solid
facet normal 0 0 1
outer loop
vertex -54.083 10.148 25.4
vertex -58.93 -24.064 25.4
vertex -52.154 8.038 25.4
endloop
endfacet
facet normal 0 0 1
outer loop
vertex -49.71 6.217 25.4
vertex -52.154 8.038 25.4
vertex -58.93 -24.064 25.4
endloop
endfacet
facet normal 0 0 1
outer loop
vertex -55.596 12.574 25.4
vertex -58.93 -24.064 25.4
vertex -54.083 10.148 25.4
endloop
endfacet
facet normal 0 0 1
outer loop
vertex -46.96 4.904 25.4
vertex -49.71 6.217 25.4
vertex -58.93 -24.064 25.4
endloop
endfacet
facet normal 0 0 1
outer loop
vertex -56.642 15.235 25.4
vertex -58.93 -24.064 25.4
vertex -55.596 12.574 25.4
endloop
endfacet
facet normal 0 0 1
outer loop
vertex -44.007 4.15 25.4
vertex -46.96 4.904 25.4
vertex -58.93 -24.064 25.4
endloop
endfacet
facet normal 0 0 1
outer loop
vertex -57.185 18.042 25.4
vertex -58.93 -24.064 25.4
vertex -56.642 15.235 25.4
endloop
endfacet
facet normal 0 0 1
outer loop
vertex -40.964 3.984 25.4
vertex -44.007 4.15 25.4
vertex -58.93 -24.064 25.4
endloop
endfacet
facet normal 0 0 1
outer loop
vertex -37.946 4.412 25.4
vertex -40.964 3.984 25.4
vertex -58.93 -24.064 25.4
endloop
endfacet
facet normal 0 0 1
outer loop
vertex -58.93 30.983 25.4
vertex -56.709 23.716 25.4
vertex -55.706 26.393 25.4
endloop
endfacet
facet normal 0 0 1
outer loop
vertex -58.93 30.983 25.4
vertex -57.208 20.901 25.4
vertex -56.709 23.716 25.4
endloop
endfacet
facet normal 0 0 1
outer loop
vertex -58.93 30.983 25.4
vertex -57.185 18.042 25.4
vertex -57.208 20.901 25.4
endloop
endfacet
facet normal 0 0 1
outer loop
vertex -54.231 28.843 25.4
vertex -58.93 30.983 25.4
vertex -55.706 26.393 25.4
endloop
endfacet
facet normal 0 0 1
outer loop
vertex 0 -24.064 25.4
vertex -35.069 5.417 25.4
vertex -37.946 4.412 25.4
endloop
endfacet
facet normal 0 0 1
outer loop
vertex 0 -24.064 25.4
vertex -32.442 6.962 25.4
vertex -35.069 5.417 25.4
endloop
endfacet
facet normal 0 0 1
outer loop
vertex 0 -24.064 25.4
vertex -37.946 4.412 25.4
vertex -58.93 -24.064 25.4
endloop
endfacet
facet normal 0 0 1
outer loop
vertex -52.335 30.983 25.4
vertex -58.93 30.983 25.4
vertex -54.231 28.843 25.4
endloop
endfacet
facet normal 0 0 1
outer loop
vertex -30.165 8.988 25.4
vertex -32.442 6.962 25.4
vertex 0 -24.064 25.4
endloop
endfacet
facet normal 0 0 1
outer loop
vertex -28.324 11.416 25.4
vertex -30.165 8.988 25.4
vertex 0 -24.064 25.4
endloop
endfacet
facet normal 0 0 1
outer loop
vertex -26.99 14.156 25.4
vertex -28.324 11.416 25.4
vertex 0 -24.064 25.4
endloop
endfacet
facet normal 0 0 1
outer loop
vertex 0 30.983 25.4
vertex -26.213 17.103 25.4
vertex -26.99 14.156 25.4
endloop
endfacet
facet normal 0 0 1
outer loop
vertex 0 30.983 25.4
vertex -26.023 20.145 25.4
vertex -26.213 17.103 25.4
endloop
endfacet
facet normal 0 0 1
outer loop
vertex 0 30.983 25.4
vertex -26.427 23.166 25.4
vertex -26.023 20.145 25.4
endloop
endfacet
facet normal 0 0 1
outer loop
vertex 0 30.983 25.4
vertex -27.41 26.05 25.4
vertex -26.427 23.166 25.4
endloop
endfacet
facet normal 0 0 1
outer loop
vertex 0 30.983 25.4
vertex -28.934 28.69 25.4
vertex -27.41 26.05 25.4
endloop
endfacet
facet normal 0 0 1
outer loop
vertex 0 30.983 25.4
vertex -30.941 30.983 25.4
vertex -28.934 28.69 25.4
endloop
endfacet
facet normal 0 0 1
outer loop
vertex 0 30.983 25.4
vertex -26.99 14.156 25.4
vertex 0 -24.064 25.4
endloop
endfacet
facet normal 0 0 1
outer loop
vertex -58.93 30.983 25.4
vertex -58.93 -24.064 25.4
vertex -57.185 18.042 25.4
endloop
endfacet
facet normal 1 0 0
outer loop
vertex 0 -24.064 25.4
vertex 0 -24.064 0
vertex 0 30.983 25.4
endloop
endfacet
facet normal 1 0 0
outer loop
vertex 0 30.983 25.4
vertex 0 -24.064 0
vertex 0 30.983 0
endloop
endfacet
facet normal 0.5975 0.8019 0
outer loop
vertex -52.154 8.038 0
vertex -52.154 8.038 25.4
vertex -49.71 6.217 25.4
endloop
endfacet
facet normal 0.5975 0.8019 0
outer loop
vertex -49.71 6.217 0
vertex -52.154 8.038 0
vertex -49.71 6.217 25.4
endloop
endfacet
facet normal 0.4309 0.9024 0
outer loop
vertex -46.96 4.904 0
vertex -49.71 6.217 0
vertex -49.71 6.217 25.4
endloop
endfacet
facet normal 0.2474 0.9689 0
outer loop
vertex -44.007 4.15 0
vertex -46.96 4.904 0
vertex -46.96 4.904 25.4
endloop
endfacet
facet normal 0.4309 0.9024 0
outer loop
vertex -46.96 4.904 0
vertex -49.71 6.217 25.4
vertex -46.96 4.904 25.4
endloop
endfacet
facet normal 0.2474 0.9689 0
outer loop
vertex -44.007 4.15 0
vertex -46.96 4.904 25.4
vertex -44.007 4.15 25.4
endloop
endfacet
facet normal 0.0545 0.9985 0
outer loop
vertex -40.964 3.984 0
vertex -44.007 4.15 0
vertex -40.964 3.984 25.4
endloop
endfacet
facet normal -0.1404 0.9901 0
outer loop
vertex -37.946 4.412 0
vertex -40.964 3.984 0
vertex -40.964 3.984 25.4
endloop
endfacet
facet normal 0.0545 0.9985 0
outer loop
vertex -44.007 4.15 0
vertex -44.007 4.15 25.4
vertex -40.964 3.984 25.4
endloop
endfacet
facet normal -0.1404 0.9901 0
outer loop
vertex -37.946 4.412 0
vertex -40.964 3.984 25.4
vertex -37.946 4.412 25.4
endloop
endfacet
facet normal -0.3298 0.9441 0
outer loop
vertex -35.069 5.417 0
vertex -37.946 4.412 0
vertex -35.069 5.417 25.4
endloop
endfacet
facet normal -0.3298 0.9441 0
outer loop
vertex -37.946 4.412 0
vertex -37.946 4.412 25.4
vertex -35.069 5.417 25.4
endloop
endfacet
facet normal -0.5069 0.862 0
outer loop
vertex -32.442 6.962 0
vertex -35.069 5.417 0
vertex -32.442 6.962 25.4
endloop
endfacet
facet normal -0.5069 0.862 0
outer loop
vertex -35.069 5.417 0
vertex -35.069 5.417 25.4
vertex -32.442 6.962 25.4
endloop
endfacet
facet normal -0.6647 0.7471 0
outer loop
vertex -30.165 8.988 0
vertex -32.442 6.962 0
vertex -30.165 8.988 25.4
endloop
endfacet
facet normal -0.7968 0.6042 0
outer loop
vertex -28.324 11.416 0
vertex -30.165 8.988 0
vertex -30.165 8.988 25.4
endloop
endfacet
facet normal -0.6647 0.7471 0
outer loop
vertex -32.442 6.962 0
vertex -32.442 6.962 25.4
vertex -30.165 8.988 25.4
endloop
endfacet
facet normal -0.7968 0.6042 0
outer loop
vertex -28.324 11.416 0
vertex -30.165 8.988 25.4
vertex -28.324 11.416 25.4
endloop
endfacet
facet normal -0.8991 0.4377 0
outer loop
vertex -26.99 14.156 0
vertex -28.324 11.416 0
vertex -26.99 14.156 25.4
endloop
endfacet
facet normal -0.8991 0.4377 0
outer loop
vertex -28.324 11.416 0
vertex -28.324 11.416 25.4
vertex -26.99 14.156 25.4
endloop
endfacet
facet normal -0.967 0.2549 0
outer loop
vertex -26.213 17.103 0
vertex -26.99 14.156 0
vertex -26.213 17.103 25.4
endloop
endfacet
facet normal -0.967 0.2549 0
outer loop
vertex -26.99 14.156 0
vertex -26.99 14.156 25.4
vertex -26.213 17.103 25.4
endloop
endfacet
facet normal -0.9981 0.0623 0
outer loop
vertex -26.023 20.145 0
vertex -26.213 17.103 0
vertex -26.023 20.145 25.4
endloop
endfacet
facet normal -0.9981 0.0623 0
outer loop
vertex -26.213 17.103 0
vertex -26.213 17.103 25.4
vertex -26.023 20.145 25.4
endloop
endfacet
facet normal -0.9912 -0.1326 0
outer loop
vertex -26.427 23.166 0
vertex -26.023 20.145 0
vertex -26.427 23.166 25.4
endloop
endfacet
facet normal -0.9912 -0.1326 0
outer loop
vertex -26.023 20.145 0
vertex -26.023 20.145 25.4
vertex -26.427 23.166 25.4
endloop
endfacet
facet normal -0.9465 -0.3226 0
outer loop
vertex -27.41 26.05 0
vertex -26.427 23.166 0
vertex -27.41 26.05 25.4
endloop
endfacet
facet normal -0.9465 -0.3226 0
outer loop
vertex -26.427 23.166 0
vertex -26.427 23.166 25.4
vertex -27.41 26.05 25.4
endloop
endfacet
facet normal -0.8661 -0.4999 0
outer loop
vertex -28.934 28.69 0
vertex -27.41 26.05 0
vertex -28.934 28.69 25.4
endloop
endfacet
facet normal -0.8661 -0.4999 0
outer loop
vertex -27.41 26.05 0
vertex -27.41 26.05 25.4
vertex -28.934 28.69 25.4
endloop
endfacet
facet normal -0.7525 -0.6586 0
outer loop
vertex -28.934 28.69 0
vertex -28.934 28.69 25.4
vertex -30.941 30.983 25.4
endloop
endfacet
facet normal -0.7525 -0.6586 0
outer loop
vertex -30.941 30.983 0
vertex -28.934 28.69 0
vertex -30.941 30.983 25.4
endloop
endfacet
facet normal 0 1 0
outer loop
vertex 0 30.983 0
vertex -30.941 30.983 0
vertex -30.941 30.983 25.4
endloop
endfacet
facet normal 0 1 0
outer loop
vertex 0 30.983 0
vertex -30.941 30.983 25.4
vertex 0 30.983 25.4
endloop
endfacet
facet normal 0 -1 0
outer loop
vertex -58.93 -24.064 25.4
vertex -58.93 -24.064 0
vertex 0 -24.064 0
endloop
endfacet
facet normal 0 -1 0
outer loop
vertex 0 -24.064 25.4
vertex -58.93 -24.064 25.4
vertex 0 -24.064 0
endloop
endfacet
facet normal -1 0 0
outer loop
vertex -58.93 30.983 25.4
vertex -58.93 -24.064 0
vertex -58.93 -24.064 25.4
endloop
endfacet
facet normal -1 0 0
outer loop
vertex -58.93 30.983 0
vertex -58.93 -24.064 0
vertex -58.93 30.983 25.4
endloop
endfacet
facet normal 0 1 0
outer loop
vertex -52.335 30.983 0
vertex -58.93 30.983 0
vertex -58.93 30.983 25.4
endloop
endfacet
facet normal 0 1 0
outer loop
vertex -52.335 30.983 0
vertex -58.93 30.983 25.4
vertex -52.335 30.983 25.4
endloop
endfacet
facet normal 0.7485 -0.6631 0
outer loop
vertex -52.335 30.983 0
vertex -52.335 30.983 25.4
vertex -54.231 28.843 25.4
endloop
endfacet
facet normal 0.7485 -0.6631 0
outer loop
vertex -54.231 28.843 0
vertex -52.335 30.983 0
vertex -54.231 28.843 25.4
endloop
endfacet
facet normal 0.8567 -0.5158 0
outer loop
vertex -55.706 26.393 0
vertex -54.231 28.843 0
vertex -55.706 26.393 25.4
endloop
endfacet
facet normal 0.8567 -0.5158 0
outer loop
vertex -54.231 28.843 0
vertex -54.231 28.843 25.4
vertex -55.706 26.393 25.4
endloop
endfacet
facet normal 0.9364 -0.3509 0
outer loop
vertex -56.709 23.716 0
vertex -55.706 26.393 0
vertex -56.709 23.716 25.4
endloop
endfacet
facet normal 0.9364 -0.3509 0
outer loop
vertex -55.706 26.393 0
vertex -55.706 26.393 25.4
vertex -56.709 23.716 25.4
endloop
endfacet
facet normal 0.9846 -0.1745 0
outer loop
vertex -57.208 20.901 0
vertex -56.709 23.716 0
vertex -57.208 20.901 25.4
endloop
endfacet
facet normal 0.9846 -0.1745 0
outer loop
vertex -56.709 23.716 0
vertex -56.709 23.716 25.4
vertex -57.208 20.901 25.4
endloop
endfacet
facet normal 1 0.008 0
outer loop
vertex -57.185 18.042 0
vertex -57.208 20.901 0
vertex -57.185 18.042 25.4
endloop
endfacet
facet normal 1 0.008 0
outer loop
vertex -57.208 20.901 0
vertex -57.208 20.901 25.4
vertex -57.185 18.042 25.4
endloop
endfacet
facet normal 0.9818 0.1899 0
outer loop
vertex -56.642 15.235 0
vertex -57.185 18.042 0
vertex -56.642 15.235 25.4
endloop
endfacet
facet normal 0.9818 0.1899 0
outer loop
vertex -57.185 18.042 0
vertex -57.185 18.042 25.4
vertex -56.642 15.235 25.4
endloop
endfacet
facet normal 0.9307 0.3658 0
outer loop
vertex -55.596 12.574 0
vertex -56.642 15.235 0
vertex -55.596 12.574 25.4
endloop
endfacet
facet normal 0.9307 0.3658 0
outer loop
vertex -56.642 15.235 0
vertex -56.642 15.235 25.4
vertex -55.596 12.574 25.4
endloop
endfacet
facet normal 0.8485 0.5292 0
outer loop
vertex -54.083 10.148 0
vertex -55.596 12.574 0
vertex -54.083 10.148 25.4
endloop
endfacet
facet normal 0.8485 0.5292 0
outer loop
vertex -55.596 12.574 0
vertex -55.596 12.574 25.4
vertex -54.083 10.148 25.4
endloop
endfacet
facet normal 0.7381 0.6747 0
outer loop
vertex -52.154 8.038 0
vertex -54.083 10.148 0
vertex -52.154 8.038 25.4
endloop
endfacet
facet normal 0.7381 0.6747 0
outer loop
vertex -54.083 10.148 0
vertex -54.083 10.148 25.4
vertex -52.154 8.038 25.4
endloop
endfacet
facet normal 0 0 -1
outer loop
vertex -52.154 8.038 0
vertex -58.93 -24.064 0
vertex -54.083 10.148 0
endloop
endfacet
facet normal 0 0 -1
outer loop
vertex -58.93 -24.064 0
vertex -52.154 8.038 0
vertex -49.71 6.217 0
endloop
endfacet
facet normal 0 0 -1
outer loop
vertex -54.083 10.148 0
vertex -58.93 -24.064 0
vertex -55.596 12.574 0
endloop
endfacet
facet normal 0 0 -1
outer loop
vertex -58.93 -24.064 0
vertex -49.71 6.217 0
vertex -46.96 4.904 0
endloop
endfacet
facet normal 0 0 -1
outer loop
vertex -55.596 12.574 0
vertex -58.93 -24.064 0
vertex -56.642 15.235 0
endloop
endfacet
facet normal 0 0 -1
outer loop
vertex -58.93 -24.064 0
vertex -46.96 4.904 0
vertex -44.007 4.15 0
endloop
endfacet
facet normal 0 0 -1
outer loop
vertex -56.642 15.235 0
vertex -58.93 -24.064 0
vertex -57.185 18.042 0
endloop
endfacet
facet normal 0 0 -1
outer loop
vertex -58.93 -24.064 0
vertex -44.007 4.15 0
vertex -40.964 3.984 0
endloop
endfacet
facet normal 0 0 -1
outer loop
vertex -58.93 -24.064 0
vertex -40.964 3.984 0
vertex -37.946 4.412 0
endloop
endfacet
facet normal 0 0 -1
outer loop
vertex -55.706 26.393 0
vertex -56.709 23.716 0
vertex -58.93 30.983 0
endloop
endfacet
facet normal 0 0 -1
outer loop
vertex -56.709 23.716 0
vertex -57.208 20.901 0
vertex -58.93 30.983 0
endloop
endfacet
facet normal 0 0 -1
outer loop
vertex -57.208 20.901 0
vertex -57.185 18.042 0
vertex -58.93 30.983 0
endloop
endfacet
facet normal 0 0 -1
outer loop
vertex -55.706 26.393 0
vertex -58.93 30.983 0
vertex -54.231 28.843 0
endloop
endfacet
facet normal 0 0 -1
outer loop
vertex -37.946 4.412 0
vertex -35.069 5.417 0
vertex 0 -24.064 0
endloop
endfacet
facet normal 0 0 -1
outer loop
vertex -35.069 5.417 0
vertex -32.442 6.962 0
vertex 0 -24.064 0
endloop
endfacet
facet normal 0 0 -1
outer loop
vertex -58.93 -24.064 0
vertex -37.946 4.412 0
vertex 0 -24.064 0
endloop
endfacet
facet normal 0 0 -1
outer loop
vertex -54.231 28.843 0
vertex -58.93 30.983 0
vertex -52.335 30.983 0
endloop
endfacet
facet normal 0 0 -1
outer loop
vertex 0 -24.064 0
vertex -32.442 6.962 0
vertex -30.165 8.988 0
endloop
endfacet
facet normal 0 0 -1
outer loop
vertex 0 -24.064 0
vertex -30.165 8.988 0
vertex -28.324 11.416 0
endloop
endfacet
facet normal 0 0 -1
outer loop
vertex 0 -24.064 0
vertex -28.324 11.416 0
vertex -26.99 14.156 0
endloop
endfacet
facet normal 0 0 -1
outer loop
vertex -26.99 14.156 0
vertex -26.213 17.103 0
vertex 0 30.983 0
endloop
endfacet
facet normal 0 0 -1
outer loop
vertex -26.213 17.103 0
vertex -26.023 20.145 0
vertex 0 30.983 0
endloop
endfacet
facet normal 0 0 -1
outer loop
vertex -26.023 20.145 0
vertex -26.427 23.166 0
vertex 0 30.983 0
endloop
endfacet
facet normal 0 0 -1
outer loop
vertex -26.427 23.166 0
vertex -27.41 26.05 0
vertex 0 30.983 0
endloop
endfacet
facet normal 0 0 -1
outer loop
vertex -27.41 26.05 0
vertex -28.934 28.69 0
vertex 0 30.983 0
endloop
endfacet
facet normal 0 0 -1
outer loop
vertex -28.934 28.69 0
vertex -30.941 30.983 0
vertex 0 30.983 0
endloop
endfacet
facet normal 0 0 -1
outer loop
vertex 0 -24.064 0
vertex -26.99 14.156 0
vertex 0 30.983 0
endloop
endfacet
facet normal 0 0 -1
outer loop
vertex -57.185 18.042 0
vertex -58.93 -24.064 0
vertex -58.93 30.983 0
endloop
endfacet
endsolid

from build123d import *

# Parameters (mm, degrees)
F0_W     = 58.9296072721
F0_H     = 55.0467334688
F1_DEPTH = 25.4
F3_DEPTH = 34.68607


with BuildPart() as f1:
    # F0 (on Top) → F1 (new body)
    with BuildSketch(Plane.XY):
        with Locations((-29.4648036361, 3.4594554454)):
            Rectangle(F0_W, F0_H)
    extrude(amount=F1_DEPTH)

    # F2 (on face) → F3 (cut)
    with BuildSketch(Plane.XY.offset(25.4)):
        with BuildLine():
            ThreePointArc((-52.1536211312, 8.0381335624), (-35.3203383975, 5.3039070161), (-26.0133259195, 19.5942856371))
            ThreePointArc((-26.0133259195, 19.5942856371), (-27.29800697, 25.7986930506), (-30.9407918835, 30.9828221798))
            Line((-30.9407918835, 30.9828221798), (-34.4491236613, 30.9828221798))
            ThreePointArc((-34.4491236613, 30.9828221798), (-44.147413461, 20.163297011), (-52.1536211312, 8.0381335624))
        make_face()
        with BuildLine():
            ThreePointArc((-52.334921143, 30.9828221798), (-57.2618993675, 19.470830523), (-52.1536211312, 8.0381335624))
            ThreePointArc((-52.1536211312, 8.0381335624), (-44.147413461, 20.163297011), (-34.4491236613, 30.9828221798))
            Line((-34.4491236613, 30.9828221798), (-52.334921143, 30.9828221798))
        make_face()
        with BuildLine():
            ThreePointArc((-34.4491236613, 30.9828221798), (-33.6460547954, 31.7472714752), (-32.834456283, 32.5026589143))
            ThreePointArc((-32.834456283, 32.5026589143), (-42.8519269969, 35.1715764522), (-52.334921143, 30.9828221798))
            Line((-52.334921143, 30.9828221798), (-34.4491236613, 30.9828221798))
        make_face()
    extrude(amount=-F3_DEPTH, mode=Mode.SUBTRACT)


solid = f1.part
